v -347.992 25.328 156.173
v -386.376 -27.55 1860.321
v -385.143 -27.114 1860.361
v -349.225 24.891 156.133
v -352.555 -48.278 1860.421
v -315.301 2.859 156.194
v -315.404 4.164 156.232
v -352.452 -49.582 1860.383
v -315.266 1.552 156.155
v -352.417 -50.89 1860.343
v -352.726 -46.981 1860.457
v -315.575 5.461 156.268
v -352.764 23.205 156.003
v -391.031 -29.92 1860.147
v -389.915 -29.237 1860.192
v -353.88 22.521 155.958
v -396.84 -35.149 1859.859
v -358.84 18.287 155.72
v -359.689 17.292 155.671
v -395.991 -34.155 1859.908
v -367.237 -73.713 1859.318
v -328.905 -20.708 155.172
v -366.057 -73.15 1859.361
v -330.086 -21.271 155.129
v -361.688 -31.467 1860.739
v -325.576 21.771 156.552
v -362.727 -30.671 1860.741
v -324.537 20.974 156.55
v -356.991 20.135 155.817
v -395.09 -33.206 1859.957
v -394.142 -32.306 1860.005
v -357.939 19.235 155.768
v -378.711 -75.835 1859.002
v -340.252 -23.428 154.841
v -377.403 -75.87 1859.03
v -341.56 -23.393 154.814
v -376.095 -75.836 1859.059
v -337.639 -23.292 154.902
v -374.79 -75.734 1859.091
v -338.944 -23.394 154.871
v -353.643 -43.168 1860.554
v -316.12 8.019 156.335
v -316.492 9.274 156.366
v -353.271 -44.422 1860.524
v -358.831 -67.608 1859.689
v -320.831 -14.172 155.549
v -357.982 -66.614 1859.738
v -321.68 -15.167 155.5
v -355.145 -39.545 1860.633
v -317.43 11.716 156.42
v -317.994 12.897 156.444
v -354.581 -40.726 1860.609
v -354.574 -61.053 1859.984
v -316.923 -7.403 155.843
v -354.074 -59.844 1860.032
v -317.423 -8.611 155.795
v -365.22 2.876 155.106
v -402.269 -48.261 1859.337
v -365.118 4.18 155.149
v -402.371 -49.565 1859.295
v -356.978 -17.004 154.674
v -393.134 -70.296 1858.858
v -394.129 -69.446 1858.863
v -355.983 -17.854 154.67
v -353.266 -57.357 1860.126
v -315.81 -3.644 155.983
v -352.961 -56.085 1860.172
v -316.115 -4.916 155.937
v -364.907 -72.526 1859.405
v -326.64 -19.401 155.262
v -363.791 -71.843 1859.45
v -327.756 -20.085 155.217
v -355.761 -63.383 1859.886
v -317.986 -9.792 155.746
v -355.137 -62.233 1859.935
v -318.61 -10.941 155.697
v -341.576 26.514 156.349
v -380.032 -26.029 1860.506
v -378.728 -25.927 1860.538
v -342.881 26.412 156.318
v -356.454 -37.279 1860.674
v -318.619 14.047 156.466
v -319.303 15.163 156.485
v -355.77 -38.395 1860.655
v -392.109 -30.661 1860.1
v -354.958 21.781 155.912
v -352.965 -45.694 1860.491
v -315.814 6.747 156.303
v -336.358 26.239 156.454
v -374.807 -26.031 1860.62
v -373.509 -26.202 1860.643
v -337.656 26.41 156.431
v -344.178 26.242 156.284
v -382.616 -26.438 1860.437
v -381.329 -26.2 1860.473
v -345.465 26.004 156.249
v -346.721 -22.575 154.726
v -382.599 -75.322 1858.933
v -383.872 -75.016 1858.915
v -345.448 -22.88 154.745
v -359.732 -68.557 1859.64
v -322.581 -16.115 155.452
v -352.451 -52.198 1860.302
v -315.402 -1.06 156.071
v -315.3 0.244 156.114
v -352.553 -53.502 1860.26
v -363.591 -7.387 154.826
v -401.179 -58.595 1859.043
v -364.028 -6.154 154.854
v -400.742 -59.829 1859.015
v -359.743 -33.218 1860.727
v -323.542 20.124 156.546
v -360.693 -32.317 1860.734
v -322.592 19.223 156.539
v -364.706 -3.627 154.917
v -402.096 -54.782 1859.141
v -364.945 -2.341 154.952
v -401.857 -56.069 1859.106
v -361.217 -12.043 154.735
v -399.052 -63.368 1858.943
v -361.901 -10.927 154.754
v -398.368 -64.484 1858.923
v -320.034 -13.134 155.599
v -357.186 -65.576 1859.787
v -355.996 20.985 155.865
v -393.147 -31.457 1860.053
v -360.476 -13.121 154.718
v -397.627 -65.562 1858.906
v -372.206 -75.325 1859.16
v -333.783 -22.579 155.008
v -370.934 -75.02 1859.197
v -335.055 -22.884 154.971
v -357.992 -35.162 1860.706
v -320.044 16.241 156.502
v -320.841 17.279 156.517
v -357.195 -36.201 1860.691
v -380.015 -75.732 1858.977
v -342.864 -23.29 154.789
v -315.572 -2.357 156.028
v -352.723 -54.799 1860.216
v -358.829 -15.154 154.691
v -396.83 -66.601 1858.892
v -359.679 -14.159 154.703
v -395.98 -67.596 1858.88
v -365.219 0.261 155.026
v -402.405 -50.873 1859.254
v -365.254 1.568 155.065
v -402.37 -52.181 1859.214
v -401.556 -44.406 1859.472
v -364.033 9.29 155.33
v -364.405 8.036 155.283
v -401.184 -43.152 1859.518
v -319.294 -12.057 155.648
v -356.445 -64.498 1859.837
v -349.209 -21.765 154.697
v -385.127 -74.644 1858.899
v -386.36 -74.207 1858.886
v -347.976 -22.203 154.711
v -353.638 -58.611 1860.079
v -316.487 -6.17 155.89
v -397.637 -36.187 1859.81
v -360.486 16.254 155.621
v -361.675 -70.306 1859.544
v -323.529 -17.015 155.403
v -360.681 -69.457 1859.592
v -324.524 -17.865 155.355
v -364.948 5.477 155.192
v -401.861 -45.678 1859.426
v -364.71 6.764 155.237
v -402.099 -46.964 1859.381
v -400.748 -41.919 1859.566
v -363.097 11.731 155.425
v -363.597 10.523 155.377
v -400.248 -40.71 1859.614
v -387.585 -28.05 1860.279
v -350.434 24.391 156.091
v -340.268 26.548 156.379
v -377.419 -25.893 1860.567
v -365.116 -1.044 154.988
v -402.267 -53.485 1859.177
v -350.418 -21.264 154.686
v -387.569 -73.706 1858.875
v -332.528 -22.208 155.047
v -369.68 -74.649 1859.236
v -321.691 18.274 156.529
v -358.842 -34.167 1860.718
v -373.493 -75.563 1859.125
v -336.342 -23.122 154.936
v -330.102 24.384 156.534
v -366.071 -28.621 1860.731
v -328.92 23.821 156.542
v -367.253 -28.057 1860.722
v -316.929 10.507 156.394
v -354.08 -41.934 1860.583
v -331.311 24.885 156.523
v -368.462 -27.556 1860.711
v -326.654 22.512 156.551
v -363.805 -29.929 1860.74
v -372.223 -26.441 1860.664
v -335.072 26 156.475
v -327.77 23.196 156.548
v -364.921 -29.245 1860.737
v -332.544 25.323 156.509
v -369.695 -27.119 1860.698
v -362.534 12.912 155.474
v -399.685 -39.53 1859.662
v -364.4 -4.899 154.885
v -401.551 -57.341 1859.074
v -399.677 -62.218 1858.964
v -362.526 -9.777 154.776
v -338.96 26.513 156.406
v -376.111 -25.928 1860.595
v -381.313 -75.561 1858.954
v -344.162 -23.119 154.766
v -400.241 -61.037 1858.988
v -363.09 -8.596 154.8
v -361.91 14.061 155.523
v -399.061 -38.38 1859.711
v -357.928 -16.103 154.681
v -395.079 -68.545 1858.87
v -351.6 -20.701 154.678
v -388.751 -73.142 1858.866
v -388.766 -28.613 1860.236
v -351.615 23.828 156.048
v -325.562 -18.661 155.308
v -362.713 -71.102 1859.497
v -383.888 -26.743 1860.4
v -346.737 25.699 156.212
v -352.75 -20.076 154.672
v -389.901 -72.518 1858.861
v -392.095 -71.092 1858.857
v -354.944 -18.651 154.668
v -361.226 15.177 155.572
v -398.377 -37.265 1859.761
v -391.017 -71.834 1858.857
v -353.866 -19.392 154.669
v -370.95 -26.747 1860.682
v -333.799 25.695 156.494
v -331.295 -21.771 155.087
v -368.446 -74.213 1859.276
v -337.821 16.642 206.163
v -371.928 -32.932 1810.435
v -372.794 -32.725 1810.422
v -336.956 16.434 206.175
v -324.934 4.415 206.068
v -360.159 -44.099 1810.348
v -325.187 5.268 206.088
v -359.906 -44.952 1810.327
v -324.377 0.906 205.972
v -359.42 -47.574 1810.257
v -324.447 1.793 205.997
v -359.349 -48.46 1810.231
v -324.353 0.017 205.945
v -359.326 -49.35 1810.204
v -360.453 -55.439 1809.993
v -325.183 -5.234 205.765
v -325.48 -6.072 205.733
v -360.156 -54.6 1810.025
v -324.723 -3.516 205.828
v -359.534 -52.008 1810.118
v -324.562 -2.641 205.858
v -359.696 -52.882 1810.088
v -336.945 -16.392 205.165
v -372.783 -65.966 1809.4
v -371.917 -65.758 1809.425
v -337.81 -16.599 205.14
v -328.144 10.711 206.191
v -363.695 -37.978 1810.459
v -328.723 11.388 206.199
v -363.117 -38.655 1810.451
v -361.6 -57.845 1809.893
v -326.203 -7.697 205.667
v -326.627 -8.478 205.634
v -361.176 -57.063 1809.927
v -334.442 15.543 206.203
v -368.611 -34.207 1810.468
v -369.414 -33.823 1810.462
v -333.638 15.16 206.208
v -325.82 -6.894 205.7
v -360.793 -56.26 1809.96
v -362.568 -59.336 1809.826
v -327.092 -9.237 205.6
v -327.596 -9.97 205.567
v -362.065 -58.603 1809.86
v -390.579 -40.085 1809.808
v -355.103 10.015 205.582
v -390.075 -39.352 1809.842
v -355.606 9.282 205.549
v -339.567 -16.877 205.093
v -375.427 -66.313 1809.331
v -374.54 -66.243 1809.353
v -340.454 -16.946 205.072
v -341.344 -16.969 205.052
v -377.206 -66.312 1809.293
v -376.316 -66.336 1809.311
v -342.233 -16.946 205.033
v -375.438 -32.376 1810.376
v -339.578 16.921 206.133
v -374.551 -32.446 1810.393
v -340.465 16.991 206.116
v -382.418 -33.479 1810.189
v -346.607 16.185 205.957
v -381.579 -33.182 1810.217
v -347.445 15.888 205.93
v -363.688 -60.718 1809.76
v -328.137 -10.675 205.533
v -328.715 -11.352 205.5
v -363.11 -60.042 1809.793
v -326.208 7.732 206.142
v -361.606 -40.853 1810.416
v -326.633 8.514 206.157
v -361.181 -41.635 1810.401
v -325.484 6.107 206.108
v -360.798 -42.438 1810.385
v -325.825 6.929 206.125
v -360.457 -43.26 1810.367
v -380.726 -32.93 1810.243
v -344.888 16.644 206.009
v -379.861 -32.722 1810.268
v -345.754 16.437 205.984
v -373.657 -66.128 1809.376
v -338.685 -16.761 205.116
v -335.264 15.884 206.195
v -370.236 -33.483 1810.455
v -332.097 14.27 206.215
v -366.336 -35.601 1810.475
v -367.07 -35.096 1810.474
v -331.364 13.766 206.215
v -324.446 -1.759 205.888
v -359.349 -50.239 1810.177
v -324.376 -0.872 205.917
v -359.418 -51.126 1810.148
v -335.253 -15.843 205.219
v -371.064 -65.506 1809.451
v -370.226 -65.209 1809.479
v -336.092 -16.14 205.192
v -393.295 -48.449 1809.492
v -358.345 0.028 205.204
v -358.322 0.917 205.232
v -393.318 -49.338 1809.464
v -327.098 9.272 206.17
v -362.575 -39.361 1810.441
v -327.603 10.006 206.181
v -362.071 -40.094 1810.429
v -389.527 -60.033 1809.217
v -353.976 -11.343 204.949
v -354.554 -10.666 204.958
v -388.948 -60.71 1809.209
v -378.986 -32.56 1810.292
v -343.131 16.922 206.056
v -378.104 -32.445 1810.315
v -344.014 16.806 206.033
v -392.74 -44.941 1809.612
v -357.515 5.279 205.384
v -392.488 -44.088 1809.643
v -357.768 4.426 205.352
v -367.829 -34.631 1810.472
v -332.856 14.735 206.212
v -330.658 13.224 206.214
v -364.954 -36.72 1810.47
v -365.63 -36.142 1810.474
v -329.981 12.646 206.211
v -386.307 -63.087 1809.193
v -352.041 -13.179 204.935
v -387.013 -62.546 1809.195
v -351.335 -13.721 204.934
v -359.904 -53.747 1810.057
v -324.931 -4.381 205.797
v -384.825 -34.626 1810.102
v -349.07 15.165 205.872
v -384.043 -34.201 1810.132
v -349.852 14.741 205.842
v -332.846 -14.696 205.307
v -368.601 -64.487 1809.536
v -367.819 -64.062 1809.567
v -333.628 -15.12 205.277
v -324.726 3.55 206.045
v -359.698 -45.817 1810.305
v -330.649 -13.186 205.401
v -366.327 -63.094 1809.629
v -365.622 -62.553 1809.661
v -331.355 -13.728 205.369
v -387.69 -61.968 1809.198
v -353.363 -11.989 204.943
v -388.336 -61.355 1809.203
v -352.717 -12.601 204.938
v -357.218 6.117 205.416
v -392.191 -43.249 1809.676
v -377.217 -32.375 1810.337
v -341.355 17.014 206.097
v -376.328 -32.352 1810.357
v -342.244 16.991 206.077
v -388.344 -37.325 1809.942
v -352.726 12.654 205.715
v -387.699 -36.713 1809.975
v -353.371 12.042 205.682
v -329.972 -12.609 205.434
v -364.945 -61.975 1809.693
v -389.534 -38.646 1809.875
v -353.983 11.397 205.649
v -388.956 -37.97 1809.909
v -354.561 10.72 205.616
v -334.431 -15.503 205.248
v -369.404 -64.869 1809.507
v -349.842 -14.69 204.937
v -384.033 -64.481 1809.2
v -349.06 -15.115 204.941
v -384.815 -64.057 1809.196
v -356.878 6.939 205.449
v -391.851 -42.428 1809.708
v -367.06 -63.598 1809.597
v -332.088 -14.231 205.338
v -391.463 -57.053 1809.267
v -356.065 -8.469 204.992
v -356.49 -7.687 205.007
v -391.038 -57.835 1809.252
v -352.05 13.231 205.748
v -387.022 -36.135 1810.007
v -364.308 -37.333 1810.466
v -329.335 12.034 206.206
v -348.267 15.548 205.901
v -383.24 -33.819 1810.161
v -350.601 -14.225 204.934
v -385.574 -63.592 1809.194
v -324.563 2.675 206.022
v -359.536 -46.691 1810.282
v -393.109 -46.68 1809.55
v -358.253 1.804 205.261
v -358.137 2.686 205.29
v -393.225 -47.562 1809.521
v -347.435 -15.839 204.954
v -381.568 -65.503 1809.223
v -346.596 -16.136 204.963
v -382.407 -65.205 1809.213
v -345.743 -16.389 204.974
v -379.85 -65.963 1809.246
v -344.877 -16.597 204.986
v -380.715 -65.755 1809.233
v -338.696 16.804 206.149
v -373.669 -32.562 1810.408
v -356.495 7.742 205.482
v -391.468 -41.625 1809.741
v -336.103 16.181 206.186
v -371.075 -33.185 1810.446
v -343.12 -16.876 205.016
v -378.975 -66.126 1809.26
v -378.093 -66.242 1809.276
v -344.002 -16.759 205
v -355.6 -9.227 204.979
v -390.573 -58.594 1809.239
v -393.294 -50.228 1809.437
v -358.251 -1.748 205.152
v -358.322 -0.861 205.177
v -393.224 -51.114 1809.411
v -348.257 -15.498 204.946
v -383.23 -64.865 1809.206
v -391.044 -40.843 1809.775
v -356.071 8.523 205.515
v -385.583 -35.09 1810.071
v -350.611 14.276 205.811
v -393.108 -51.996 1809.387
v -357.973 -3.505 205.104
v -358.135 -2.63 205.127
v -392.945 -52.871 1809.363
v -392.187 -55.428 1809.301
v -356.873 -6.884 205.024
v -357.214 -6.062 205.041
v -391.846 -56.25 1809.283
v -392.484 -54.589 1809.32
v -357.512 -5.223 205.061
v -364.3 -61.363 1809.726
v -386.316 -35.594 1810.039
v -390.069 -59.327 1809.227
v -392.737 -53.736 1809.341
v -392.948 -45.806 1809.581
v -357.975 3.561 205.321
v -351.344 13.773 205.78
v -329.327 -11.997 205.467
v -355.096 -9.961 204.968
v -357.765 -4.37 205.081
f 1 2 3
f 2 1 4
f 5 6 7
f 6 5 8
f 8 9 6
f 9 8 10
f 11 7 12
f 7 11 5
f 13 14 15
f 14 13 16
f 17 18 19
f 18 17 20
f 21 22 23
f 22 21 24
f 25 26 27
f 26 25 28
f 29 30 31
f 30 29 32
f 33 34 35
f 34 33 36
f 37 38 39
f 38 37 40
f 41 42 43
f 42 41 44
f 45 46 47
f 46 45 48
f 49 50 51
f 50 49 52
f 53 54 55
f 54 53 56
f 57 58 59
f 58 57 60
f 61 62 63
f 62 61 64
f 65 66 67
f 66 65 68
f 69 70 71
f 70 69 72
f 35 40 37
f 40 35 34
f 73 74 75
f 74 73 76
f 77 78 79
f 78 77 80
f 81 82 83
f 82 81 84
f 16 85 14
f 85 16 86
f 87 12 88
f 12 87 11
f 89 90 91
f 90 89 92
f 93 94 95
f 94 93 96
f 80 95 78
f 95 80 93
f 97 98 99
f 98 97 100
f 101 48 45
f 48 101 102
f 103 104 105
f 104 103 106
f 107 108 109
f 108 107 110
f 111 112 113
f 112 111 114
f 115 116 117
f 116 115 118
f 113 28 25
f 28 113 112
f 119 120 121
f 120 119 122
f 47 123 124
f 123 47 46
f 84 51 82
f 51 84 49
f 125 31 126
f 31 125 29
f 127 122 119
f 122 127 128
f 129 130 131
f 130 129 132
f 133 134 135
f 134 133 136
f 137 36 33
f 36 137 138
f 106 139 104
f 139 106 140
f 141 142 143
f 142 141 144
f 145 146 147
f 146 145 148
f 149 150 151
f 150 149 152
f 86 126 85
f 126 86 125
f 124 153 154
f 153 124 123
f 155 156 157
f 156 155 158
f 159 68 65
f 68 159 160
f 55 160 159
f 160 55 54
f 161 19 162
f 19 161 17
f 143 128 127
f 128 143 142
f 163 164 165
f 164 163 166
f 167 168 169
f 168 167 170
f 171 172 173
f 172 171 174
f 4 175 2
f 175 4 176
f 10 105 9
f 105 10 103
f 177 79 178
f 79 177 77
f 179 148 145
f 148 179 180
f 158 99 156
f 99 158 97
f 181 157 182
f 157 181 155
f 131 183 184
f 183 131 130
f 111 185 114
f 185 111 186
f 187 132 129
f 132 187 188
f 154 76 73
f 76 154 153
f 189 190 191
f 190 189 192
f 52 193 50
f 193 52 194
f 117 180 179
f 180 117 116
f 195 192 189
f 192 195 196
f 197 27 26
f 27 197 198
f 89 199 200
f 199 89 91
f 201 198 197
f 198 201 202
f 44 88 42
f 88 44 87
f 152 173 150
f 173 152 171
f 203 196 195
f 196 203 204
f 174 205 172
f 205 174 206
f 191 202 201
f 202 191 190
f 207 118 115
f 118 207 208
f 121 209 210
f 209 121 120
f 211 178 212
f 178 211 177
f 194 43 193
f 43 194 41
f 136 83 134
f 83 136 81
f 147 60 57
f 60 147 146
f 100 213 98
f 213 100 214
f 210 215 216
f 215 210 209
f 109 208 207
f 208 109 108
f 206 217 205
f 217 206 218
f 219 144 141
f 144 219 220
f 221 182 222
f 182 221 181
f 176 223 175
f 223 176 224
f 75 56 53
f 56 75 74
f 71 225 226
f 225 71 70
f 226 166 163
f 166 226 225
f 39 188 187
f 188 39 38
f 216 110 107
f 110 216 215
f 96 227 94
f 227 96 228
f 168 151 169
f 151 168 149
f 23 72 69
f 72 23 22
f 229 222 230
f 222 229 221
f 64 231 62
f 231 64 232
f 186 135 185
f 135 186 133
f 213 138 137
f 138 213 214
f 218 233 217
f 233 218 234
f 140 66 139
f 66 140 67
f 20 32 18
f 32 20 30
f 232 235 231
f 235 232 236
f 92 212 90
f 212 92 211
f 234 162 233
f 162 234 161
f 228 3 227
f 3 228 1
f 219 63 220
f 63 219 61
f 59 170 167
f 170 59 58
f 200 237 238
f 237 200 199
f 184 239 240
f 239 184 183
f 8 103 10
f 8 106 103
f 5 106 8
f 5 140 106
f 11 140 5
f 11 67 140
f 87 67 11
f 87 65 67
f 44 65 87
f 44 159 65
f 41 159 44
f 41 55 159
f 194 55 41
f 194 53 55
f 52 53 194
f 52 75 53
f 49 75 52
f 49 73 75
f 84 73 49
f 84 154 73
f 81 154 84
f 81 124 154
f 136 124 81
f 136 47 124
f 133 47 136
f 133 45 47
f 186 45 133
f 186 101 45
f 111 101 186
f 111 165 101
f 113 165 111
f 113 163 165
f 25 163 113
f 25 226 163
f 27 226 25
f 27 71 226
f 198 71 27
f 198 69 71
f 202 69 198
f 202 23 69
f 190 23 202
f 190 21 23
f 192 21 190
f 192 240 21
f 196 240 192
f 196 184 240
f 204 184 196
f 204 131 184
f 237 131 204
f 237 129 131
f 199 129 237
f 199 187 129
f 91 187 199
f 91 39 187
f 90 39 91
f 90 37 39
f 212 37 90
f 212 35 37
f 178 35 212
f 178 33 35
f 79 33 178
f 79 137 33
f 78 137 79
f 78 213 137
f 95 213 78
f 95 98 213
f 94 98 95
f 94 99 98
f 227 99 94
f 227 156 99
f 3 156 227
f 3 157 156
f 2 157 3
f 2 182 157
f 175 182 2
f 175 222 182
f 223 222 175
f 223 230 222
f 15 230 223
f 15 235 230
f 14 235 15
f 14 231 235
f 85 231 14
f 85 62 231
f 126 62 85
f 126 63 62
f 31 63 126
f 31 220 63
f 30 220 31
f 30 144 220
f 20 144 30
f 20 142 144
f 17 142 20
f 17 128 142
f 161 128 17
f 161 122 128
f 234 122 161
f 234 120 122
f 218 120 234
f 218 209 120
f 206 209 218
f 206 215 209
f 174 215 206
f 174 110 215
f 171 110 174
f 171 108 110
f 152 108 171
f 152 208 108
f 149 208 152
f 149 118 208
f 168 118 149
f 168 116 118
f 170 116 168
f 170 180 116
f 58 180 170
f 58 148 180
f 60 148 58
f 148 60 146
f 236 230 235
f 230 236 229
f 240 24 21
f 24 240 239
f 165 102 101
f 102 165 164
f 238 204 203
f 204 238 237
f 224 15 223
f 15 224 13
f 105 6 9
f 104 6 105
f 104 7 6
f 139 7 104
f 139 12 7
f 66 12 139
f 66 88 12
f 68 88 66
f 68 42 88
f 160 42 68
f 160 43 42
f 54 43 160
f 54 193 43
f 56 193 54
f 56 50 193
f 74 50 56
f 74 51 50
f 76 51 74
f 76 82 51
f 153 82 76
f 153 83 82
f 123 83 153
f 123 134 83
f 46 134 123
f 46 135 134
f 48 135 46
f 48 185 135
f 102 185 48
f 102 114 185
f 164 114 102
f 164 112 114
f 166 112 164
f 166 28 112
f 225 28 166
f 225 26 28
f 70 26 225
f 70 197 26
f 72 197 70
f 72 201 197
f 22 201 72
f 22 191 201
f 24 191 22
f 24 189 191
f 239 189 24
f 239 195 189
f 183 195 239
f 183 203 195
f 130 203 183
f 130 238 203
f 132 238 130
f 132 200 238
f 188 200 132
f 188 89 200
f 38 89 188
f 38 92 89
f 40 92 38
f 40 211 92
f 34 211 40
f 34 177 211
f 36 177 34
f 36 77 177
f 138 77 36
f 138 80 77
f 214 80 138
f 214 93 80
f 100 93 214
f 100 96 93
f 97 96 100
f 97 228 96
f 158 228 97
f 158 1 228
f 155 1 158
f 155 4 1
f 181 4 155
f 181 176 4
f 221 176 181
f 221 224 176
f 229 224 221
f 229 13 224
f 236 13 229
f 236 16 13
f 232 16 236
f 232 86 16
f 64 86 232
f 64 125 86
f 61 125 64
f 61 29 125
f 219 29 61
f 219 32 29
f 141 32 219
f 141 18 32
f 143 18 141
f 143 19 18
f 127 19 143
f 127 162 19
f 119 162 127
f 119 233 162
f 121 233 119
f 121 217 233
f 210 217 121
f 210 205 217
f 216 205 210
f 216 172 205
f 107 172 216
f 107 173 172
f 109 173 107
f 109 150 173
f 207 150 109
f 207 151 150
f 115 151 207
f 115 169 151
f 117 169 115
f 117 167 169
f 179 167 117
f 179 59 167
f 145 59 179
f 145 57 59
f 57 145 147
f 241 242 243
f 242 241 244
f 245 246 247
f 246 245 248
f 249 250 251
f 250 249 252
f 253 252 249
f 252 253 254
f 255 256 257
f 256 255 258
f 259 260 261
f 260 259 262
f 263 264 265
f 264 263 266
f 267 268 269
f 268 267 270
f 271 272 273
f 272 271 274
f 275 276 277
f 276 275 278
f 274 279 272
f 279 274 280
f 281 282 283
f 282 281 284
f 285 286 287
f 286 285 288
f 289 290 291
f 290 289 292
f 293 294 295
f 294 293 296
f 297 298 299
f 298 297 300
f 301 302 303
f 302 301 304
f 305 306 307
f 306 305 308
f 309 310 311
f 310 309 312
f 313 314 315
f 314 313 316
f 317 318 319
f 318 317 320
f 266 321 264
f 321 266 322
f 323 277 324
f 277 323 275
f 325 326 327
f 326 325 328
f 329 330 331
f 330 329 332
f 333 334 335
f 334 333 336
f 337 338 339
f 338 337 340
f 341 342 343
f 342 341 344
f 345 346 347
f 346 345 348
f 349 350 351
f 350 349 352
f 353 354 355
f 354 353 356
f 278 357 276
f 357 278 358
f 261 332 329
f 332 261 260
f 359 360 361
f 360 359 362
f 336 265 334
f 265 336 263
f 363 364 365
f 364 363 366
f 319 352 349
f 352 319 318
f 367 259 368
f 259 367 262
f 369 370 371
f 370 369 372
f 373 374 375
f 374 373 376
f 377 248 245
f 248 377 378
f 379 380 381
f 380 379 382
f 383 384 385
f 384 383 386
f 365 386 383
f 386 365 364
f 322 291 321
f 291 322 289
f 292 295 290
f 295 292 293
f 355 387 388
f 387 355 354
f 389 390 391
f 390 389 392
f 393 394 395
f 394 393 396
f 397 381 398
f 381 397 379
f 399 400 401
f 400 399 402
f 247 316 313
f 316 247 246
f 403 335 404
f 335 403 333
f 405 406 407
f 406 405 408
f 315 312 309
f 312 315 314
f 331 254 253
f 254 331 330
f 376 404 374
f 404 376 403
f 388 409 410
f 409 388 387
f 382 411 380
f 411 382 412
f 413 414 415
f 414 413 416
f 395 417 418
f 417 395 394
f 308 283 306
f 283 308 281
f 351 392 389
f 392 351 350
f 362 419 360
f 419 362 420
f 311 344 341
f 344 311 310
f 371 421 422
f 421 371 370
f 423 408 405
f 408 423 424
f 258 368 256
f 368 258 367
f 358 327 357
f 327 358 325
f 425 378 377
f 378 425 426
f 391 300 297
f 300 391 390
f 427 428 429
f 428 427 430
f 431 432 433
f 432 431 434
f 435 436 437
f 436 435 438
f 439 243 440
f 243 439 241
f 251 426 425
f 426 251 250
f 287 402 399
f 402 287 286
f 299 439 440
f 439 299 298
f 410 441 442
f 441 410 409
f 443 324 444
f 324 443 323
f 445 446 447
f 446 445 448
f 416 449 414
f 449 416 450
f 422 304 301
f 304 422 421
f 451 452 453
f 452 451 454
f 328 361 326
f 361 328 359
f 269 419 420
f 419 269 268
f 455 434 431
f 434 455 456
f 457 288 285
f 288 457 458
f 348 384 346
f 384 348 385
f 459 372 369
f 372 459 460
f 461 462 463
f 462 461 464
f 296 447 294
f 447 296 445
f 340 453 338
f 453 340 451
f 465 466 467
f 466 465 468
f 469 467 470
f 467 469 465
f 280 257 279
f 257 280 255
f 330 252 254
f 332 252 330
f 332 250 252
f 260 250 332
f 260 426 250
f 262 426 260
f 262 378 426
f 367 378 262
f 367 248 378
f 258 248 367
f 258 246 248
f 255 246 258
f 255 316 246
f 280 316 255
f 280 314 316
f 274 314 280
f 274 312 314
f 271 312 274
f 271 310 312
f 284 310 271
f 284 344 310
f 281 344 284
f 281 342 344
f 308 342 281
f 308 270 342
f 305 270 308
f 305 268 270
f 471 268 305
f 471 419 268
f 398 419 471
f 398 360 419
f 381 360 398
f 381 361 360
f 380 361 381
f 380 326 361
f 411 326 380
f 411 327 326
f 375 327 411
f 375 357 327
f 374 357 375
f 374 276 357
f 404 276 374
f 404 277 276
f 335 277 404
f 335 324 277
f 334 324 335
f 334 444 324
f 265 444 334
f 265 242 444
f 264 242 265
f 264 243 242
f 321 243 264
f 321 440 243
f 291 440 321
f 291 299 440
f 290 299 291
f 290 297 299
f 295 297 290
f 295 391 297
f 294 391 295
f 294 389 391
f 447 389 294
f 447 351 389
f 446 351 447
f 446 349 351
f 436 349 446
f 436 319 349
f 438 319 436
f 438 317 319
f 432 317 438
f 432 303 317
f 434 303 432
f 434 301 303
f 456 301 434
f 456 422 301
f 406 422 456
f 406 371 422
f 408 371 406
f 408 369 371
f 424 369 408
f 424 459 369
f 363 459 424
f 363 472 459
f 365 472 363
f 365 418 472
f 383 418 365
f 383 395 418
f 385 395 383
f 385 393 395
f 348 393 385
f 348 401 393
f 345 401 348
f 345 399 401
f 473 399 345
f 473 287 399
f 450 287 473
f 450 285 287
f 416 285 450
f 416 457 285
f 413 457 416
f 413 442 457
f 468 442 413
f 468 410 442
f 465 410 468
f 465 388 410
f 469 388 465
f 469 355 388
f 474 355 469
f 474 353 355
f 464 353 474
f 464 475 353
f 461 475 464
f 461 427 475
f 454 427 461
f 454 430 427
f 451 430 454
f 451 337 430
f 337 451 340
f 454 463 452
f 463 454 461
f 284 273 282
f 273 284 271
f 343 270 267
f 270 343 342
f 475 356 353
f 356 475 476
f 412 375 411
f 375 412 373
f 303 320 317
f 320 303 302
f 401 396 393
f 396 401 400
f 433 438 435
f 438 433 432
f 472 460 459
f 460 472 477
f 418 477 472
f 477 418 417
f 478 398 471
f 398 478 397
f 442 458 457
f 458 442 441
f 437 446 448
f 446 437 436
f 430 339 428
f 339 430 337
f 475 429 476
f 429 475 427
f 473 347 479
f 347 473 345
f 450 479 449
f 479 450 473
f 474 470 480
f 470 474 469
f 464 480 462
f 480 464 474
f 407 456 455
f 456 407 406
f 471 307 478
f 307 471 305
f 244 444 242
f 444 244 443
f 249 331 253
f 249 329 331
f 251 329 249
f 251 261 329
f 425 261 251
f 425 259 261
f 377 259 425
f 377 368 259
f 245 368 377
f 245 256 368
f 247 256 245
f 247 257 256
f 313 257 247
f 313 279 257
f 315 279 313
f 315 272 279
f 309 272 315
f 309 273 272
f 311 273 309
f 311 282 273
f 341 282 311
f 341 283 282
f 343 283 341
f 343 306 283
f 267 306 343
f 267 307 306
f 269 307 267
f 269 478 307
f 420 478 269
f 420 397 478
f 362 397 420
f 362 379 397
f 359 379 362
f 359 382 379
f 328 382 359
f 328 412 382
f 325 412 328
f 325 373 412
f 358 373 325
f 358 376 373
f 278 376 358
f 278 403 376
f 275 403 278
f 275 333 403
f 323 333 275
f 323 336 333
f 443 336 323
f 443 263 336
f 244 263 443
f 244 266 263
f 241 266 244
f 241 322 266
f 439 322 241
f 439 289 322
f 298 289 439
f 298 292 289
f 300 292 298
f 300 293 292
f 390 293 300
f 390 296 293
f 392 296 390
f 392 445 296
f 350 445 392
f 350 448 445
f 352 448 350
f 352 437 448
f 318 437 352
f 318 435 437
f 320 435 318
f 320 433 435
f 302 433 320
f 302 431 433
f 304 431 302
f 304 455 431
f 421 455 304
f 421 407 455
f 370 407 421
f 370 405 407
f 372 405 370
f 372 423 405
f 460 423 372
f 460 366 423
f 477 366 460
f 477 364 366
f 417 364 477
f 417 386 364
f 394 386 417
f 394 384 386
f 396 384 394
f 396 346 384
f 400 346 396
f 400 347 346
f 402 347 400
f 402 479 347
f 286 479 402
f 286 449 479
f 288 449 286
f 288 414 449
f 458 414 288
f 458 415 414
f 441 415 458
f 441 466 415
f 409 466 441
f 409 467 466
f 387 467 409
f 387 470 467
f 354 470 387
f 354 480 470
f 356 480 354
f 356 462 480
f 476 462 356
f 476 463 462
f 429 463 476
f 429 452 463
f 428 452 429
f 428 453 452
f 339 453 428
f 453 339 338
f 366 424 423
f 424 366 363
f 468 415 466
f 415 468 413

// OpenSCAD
// ============================================================================
// Clements 49 — frame/pillar.scad
// COMPONENT: the PILLAR / column.
//
// materials.md S6.3: hollow tube, UD-flax along the column axis + woven hoop
// layers; ~50 mm OD class; buckling-governed (buckling forgives flax's low
// modulus, S2.1). All-flax is viable. Wood mode = a solid carved column for
// the traditional reference instrument.
//
// Geometry: a slightly-leaning column on the pillar_bottom_mm -> pillar_top_mm
// axis (anchors), length pillar_length_mm, OD pillar_od(), wall pillar_wall().
// In wood mode pillar_wall() == OD (solid). Colour via as_shell().
//
// Module contract:  module pillar();   (no required args)
//
// CASTING HOOK: NONE generated this run (hard constraint). The pillar is one
// solid module a future offset-shell can wrap; no mold/cavity here.
//
// Include shared single-source params + schedule (do NOT redefine their vars).
// ============================================================================
include <../params.scad>
include <../strings.scad>

// ----------------------------------------------------------------------------
// Internal: place a child built along +z (length L) onto the leaning pillar
// axis, translated to pillar_bottom_mm and rotated so +z -> pillar_axis_dir().
// rotate to align unit +z with the (near-vertical) axis direction.
// ----------------------------------------------------------------------------
module _pillar_place() {
    dir = pillar_axis_dir();              // unit vector bottom->top
    // angle between +z and dir, about the axis perpendicular to both.
    ang = acos(dir[2]);                   // tilt off vertical (deg)
    rot_axis = (norm([dir[1], -dir[0], 0]) < 1e-6)
                 ? [0, 0, 1]              // already vertical: no rotation needed
                 : [dir[1], -dir[0], 0];  // = cross([0,0,1], dir)
    translate(pillar_bottom_mm)
        rotate(a = ang, v = rot_axis)
            children();
}

// ----------------------------------------------------------------------------
// PILLAR — the structural column.
//   flax: hollow UD-flax/woven-hoop tube, OD pillar_od(), wall pillar_wall().
//   wood: solid carved column, OD pillar_od_mm_wood (wall==OD/2 => solid).
// Capped slightly oversize at both ends so it visually seats into the neck
// (top) and base (bottom) joins; future offset-shell / join modules trim.
// ----------------------------------------------------------------------------
module pillar() {
    L    = pillar_length_mm;
    od   = pillar_od();
    wall = pillar_wall();
    id   = max(0, od - 2 * wall);         // bore (0 in wood/solid mode)
    solid = (id <= 0.01);

    as_shell()
    _pillar_place() {
        // Main shaft along +z.
        if (solid) {
            cylinder(h = L, d = od, $fn = fn_high);
        } else {
            difference() {
                cylinder(h = L, d = od, $fn = fn_high);
                // bore: lift off the ends so the tube reads as capped sockets
                // at the neck/base joins (leaves material for those junctions).
                translate([0, 0, od])
                    cylinder(h = L - 2 * od, d = id, $fn = fn_high);
            }
        }
    }

    // --- Echo key derived dimensions -----------------------------------------
    echo(str("[pillar] material=", material,
             "  OD=", od, " mm  wall=", wall, " mm  ID=", id, " mm"));
    echo(str("[pillar] length=", L, " mm  tilt-off-vertical=",
             acos(pillar_axis_dir()[2]), " deg"));
    // Buckling sanity (Euler, K=1 pinned-pinned) is informational only here:
    A_mm2 = solid ? PI/4*od*od : PI/4*(od*od - id*id);
    echo(str("[pillar] section area=", A_mm2, " mm^2   axial load (basis)=",
             load_pillar_axial_N, " N -> mean stress=",
             load_pillar_axial_N / A_mm2, " MPa"));
}

// ----------------------------------------------------------------------------
// Guarded self-preview. Renders the pillar ONLY when this file is the top file.
// An assembly that include<>s this file sets pillar_preview=false (or just
// defines it earlier) to suppress the stray preview geometry.
// ----------------------------------------------------------------------------
pillar_preview = is_undef(pillar_preview) ? true : pillar_preview;
if (pillar_preview) pillar();
